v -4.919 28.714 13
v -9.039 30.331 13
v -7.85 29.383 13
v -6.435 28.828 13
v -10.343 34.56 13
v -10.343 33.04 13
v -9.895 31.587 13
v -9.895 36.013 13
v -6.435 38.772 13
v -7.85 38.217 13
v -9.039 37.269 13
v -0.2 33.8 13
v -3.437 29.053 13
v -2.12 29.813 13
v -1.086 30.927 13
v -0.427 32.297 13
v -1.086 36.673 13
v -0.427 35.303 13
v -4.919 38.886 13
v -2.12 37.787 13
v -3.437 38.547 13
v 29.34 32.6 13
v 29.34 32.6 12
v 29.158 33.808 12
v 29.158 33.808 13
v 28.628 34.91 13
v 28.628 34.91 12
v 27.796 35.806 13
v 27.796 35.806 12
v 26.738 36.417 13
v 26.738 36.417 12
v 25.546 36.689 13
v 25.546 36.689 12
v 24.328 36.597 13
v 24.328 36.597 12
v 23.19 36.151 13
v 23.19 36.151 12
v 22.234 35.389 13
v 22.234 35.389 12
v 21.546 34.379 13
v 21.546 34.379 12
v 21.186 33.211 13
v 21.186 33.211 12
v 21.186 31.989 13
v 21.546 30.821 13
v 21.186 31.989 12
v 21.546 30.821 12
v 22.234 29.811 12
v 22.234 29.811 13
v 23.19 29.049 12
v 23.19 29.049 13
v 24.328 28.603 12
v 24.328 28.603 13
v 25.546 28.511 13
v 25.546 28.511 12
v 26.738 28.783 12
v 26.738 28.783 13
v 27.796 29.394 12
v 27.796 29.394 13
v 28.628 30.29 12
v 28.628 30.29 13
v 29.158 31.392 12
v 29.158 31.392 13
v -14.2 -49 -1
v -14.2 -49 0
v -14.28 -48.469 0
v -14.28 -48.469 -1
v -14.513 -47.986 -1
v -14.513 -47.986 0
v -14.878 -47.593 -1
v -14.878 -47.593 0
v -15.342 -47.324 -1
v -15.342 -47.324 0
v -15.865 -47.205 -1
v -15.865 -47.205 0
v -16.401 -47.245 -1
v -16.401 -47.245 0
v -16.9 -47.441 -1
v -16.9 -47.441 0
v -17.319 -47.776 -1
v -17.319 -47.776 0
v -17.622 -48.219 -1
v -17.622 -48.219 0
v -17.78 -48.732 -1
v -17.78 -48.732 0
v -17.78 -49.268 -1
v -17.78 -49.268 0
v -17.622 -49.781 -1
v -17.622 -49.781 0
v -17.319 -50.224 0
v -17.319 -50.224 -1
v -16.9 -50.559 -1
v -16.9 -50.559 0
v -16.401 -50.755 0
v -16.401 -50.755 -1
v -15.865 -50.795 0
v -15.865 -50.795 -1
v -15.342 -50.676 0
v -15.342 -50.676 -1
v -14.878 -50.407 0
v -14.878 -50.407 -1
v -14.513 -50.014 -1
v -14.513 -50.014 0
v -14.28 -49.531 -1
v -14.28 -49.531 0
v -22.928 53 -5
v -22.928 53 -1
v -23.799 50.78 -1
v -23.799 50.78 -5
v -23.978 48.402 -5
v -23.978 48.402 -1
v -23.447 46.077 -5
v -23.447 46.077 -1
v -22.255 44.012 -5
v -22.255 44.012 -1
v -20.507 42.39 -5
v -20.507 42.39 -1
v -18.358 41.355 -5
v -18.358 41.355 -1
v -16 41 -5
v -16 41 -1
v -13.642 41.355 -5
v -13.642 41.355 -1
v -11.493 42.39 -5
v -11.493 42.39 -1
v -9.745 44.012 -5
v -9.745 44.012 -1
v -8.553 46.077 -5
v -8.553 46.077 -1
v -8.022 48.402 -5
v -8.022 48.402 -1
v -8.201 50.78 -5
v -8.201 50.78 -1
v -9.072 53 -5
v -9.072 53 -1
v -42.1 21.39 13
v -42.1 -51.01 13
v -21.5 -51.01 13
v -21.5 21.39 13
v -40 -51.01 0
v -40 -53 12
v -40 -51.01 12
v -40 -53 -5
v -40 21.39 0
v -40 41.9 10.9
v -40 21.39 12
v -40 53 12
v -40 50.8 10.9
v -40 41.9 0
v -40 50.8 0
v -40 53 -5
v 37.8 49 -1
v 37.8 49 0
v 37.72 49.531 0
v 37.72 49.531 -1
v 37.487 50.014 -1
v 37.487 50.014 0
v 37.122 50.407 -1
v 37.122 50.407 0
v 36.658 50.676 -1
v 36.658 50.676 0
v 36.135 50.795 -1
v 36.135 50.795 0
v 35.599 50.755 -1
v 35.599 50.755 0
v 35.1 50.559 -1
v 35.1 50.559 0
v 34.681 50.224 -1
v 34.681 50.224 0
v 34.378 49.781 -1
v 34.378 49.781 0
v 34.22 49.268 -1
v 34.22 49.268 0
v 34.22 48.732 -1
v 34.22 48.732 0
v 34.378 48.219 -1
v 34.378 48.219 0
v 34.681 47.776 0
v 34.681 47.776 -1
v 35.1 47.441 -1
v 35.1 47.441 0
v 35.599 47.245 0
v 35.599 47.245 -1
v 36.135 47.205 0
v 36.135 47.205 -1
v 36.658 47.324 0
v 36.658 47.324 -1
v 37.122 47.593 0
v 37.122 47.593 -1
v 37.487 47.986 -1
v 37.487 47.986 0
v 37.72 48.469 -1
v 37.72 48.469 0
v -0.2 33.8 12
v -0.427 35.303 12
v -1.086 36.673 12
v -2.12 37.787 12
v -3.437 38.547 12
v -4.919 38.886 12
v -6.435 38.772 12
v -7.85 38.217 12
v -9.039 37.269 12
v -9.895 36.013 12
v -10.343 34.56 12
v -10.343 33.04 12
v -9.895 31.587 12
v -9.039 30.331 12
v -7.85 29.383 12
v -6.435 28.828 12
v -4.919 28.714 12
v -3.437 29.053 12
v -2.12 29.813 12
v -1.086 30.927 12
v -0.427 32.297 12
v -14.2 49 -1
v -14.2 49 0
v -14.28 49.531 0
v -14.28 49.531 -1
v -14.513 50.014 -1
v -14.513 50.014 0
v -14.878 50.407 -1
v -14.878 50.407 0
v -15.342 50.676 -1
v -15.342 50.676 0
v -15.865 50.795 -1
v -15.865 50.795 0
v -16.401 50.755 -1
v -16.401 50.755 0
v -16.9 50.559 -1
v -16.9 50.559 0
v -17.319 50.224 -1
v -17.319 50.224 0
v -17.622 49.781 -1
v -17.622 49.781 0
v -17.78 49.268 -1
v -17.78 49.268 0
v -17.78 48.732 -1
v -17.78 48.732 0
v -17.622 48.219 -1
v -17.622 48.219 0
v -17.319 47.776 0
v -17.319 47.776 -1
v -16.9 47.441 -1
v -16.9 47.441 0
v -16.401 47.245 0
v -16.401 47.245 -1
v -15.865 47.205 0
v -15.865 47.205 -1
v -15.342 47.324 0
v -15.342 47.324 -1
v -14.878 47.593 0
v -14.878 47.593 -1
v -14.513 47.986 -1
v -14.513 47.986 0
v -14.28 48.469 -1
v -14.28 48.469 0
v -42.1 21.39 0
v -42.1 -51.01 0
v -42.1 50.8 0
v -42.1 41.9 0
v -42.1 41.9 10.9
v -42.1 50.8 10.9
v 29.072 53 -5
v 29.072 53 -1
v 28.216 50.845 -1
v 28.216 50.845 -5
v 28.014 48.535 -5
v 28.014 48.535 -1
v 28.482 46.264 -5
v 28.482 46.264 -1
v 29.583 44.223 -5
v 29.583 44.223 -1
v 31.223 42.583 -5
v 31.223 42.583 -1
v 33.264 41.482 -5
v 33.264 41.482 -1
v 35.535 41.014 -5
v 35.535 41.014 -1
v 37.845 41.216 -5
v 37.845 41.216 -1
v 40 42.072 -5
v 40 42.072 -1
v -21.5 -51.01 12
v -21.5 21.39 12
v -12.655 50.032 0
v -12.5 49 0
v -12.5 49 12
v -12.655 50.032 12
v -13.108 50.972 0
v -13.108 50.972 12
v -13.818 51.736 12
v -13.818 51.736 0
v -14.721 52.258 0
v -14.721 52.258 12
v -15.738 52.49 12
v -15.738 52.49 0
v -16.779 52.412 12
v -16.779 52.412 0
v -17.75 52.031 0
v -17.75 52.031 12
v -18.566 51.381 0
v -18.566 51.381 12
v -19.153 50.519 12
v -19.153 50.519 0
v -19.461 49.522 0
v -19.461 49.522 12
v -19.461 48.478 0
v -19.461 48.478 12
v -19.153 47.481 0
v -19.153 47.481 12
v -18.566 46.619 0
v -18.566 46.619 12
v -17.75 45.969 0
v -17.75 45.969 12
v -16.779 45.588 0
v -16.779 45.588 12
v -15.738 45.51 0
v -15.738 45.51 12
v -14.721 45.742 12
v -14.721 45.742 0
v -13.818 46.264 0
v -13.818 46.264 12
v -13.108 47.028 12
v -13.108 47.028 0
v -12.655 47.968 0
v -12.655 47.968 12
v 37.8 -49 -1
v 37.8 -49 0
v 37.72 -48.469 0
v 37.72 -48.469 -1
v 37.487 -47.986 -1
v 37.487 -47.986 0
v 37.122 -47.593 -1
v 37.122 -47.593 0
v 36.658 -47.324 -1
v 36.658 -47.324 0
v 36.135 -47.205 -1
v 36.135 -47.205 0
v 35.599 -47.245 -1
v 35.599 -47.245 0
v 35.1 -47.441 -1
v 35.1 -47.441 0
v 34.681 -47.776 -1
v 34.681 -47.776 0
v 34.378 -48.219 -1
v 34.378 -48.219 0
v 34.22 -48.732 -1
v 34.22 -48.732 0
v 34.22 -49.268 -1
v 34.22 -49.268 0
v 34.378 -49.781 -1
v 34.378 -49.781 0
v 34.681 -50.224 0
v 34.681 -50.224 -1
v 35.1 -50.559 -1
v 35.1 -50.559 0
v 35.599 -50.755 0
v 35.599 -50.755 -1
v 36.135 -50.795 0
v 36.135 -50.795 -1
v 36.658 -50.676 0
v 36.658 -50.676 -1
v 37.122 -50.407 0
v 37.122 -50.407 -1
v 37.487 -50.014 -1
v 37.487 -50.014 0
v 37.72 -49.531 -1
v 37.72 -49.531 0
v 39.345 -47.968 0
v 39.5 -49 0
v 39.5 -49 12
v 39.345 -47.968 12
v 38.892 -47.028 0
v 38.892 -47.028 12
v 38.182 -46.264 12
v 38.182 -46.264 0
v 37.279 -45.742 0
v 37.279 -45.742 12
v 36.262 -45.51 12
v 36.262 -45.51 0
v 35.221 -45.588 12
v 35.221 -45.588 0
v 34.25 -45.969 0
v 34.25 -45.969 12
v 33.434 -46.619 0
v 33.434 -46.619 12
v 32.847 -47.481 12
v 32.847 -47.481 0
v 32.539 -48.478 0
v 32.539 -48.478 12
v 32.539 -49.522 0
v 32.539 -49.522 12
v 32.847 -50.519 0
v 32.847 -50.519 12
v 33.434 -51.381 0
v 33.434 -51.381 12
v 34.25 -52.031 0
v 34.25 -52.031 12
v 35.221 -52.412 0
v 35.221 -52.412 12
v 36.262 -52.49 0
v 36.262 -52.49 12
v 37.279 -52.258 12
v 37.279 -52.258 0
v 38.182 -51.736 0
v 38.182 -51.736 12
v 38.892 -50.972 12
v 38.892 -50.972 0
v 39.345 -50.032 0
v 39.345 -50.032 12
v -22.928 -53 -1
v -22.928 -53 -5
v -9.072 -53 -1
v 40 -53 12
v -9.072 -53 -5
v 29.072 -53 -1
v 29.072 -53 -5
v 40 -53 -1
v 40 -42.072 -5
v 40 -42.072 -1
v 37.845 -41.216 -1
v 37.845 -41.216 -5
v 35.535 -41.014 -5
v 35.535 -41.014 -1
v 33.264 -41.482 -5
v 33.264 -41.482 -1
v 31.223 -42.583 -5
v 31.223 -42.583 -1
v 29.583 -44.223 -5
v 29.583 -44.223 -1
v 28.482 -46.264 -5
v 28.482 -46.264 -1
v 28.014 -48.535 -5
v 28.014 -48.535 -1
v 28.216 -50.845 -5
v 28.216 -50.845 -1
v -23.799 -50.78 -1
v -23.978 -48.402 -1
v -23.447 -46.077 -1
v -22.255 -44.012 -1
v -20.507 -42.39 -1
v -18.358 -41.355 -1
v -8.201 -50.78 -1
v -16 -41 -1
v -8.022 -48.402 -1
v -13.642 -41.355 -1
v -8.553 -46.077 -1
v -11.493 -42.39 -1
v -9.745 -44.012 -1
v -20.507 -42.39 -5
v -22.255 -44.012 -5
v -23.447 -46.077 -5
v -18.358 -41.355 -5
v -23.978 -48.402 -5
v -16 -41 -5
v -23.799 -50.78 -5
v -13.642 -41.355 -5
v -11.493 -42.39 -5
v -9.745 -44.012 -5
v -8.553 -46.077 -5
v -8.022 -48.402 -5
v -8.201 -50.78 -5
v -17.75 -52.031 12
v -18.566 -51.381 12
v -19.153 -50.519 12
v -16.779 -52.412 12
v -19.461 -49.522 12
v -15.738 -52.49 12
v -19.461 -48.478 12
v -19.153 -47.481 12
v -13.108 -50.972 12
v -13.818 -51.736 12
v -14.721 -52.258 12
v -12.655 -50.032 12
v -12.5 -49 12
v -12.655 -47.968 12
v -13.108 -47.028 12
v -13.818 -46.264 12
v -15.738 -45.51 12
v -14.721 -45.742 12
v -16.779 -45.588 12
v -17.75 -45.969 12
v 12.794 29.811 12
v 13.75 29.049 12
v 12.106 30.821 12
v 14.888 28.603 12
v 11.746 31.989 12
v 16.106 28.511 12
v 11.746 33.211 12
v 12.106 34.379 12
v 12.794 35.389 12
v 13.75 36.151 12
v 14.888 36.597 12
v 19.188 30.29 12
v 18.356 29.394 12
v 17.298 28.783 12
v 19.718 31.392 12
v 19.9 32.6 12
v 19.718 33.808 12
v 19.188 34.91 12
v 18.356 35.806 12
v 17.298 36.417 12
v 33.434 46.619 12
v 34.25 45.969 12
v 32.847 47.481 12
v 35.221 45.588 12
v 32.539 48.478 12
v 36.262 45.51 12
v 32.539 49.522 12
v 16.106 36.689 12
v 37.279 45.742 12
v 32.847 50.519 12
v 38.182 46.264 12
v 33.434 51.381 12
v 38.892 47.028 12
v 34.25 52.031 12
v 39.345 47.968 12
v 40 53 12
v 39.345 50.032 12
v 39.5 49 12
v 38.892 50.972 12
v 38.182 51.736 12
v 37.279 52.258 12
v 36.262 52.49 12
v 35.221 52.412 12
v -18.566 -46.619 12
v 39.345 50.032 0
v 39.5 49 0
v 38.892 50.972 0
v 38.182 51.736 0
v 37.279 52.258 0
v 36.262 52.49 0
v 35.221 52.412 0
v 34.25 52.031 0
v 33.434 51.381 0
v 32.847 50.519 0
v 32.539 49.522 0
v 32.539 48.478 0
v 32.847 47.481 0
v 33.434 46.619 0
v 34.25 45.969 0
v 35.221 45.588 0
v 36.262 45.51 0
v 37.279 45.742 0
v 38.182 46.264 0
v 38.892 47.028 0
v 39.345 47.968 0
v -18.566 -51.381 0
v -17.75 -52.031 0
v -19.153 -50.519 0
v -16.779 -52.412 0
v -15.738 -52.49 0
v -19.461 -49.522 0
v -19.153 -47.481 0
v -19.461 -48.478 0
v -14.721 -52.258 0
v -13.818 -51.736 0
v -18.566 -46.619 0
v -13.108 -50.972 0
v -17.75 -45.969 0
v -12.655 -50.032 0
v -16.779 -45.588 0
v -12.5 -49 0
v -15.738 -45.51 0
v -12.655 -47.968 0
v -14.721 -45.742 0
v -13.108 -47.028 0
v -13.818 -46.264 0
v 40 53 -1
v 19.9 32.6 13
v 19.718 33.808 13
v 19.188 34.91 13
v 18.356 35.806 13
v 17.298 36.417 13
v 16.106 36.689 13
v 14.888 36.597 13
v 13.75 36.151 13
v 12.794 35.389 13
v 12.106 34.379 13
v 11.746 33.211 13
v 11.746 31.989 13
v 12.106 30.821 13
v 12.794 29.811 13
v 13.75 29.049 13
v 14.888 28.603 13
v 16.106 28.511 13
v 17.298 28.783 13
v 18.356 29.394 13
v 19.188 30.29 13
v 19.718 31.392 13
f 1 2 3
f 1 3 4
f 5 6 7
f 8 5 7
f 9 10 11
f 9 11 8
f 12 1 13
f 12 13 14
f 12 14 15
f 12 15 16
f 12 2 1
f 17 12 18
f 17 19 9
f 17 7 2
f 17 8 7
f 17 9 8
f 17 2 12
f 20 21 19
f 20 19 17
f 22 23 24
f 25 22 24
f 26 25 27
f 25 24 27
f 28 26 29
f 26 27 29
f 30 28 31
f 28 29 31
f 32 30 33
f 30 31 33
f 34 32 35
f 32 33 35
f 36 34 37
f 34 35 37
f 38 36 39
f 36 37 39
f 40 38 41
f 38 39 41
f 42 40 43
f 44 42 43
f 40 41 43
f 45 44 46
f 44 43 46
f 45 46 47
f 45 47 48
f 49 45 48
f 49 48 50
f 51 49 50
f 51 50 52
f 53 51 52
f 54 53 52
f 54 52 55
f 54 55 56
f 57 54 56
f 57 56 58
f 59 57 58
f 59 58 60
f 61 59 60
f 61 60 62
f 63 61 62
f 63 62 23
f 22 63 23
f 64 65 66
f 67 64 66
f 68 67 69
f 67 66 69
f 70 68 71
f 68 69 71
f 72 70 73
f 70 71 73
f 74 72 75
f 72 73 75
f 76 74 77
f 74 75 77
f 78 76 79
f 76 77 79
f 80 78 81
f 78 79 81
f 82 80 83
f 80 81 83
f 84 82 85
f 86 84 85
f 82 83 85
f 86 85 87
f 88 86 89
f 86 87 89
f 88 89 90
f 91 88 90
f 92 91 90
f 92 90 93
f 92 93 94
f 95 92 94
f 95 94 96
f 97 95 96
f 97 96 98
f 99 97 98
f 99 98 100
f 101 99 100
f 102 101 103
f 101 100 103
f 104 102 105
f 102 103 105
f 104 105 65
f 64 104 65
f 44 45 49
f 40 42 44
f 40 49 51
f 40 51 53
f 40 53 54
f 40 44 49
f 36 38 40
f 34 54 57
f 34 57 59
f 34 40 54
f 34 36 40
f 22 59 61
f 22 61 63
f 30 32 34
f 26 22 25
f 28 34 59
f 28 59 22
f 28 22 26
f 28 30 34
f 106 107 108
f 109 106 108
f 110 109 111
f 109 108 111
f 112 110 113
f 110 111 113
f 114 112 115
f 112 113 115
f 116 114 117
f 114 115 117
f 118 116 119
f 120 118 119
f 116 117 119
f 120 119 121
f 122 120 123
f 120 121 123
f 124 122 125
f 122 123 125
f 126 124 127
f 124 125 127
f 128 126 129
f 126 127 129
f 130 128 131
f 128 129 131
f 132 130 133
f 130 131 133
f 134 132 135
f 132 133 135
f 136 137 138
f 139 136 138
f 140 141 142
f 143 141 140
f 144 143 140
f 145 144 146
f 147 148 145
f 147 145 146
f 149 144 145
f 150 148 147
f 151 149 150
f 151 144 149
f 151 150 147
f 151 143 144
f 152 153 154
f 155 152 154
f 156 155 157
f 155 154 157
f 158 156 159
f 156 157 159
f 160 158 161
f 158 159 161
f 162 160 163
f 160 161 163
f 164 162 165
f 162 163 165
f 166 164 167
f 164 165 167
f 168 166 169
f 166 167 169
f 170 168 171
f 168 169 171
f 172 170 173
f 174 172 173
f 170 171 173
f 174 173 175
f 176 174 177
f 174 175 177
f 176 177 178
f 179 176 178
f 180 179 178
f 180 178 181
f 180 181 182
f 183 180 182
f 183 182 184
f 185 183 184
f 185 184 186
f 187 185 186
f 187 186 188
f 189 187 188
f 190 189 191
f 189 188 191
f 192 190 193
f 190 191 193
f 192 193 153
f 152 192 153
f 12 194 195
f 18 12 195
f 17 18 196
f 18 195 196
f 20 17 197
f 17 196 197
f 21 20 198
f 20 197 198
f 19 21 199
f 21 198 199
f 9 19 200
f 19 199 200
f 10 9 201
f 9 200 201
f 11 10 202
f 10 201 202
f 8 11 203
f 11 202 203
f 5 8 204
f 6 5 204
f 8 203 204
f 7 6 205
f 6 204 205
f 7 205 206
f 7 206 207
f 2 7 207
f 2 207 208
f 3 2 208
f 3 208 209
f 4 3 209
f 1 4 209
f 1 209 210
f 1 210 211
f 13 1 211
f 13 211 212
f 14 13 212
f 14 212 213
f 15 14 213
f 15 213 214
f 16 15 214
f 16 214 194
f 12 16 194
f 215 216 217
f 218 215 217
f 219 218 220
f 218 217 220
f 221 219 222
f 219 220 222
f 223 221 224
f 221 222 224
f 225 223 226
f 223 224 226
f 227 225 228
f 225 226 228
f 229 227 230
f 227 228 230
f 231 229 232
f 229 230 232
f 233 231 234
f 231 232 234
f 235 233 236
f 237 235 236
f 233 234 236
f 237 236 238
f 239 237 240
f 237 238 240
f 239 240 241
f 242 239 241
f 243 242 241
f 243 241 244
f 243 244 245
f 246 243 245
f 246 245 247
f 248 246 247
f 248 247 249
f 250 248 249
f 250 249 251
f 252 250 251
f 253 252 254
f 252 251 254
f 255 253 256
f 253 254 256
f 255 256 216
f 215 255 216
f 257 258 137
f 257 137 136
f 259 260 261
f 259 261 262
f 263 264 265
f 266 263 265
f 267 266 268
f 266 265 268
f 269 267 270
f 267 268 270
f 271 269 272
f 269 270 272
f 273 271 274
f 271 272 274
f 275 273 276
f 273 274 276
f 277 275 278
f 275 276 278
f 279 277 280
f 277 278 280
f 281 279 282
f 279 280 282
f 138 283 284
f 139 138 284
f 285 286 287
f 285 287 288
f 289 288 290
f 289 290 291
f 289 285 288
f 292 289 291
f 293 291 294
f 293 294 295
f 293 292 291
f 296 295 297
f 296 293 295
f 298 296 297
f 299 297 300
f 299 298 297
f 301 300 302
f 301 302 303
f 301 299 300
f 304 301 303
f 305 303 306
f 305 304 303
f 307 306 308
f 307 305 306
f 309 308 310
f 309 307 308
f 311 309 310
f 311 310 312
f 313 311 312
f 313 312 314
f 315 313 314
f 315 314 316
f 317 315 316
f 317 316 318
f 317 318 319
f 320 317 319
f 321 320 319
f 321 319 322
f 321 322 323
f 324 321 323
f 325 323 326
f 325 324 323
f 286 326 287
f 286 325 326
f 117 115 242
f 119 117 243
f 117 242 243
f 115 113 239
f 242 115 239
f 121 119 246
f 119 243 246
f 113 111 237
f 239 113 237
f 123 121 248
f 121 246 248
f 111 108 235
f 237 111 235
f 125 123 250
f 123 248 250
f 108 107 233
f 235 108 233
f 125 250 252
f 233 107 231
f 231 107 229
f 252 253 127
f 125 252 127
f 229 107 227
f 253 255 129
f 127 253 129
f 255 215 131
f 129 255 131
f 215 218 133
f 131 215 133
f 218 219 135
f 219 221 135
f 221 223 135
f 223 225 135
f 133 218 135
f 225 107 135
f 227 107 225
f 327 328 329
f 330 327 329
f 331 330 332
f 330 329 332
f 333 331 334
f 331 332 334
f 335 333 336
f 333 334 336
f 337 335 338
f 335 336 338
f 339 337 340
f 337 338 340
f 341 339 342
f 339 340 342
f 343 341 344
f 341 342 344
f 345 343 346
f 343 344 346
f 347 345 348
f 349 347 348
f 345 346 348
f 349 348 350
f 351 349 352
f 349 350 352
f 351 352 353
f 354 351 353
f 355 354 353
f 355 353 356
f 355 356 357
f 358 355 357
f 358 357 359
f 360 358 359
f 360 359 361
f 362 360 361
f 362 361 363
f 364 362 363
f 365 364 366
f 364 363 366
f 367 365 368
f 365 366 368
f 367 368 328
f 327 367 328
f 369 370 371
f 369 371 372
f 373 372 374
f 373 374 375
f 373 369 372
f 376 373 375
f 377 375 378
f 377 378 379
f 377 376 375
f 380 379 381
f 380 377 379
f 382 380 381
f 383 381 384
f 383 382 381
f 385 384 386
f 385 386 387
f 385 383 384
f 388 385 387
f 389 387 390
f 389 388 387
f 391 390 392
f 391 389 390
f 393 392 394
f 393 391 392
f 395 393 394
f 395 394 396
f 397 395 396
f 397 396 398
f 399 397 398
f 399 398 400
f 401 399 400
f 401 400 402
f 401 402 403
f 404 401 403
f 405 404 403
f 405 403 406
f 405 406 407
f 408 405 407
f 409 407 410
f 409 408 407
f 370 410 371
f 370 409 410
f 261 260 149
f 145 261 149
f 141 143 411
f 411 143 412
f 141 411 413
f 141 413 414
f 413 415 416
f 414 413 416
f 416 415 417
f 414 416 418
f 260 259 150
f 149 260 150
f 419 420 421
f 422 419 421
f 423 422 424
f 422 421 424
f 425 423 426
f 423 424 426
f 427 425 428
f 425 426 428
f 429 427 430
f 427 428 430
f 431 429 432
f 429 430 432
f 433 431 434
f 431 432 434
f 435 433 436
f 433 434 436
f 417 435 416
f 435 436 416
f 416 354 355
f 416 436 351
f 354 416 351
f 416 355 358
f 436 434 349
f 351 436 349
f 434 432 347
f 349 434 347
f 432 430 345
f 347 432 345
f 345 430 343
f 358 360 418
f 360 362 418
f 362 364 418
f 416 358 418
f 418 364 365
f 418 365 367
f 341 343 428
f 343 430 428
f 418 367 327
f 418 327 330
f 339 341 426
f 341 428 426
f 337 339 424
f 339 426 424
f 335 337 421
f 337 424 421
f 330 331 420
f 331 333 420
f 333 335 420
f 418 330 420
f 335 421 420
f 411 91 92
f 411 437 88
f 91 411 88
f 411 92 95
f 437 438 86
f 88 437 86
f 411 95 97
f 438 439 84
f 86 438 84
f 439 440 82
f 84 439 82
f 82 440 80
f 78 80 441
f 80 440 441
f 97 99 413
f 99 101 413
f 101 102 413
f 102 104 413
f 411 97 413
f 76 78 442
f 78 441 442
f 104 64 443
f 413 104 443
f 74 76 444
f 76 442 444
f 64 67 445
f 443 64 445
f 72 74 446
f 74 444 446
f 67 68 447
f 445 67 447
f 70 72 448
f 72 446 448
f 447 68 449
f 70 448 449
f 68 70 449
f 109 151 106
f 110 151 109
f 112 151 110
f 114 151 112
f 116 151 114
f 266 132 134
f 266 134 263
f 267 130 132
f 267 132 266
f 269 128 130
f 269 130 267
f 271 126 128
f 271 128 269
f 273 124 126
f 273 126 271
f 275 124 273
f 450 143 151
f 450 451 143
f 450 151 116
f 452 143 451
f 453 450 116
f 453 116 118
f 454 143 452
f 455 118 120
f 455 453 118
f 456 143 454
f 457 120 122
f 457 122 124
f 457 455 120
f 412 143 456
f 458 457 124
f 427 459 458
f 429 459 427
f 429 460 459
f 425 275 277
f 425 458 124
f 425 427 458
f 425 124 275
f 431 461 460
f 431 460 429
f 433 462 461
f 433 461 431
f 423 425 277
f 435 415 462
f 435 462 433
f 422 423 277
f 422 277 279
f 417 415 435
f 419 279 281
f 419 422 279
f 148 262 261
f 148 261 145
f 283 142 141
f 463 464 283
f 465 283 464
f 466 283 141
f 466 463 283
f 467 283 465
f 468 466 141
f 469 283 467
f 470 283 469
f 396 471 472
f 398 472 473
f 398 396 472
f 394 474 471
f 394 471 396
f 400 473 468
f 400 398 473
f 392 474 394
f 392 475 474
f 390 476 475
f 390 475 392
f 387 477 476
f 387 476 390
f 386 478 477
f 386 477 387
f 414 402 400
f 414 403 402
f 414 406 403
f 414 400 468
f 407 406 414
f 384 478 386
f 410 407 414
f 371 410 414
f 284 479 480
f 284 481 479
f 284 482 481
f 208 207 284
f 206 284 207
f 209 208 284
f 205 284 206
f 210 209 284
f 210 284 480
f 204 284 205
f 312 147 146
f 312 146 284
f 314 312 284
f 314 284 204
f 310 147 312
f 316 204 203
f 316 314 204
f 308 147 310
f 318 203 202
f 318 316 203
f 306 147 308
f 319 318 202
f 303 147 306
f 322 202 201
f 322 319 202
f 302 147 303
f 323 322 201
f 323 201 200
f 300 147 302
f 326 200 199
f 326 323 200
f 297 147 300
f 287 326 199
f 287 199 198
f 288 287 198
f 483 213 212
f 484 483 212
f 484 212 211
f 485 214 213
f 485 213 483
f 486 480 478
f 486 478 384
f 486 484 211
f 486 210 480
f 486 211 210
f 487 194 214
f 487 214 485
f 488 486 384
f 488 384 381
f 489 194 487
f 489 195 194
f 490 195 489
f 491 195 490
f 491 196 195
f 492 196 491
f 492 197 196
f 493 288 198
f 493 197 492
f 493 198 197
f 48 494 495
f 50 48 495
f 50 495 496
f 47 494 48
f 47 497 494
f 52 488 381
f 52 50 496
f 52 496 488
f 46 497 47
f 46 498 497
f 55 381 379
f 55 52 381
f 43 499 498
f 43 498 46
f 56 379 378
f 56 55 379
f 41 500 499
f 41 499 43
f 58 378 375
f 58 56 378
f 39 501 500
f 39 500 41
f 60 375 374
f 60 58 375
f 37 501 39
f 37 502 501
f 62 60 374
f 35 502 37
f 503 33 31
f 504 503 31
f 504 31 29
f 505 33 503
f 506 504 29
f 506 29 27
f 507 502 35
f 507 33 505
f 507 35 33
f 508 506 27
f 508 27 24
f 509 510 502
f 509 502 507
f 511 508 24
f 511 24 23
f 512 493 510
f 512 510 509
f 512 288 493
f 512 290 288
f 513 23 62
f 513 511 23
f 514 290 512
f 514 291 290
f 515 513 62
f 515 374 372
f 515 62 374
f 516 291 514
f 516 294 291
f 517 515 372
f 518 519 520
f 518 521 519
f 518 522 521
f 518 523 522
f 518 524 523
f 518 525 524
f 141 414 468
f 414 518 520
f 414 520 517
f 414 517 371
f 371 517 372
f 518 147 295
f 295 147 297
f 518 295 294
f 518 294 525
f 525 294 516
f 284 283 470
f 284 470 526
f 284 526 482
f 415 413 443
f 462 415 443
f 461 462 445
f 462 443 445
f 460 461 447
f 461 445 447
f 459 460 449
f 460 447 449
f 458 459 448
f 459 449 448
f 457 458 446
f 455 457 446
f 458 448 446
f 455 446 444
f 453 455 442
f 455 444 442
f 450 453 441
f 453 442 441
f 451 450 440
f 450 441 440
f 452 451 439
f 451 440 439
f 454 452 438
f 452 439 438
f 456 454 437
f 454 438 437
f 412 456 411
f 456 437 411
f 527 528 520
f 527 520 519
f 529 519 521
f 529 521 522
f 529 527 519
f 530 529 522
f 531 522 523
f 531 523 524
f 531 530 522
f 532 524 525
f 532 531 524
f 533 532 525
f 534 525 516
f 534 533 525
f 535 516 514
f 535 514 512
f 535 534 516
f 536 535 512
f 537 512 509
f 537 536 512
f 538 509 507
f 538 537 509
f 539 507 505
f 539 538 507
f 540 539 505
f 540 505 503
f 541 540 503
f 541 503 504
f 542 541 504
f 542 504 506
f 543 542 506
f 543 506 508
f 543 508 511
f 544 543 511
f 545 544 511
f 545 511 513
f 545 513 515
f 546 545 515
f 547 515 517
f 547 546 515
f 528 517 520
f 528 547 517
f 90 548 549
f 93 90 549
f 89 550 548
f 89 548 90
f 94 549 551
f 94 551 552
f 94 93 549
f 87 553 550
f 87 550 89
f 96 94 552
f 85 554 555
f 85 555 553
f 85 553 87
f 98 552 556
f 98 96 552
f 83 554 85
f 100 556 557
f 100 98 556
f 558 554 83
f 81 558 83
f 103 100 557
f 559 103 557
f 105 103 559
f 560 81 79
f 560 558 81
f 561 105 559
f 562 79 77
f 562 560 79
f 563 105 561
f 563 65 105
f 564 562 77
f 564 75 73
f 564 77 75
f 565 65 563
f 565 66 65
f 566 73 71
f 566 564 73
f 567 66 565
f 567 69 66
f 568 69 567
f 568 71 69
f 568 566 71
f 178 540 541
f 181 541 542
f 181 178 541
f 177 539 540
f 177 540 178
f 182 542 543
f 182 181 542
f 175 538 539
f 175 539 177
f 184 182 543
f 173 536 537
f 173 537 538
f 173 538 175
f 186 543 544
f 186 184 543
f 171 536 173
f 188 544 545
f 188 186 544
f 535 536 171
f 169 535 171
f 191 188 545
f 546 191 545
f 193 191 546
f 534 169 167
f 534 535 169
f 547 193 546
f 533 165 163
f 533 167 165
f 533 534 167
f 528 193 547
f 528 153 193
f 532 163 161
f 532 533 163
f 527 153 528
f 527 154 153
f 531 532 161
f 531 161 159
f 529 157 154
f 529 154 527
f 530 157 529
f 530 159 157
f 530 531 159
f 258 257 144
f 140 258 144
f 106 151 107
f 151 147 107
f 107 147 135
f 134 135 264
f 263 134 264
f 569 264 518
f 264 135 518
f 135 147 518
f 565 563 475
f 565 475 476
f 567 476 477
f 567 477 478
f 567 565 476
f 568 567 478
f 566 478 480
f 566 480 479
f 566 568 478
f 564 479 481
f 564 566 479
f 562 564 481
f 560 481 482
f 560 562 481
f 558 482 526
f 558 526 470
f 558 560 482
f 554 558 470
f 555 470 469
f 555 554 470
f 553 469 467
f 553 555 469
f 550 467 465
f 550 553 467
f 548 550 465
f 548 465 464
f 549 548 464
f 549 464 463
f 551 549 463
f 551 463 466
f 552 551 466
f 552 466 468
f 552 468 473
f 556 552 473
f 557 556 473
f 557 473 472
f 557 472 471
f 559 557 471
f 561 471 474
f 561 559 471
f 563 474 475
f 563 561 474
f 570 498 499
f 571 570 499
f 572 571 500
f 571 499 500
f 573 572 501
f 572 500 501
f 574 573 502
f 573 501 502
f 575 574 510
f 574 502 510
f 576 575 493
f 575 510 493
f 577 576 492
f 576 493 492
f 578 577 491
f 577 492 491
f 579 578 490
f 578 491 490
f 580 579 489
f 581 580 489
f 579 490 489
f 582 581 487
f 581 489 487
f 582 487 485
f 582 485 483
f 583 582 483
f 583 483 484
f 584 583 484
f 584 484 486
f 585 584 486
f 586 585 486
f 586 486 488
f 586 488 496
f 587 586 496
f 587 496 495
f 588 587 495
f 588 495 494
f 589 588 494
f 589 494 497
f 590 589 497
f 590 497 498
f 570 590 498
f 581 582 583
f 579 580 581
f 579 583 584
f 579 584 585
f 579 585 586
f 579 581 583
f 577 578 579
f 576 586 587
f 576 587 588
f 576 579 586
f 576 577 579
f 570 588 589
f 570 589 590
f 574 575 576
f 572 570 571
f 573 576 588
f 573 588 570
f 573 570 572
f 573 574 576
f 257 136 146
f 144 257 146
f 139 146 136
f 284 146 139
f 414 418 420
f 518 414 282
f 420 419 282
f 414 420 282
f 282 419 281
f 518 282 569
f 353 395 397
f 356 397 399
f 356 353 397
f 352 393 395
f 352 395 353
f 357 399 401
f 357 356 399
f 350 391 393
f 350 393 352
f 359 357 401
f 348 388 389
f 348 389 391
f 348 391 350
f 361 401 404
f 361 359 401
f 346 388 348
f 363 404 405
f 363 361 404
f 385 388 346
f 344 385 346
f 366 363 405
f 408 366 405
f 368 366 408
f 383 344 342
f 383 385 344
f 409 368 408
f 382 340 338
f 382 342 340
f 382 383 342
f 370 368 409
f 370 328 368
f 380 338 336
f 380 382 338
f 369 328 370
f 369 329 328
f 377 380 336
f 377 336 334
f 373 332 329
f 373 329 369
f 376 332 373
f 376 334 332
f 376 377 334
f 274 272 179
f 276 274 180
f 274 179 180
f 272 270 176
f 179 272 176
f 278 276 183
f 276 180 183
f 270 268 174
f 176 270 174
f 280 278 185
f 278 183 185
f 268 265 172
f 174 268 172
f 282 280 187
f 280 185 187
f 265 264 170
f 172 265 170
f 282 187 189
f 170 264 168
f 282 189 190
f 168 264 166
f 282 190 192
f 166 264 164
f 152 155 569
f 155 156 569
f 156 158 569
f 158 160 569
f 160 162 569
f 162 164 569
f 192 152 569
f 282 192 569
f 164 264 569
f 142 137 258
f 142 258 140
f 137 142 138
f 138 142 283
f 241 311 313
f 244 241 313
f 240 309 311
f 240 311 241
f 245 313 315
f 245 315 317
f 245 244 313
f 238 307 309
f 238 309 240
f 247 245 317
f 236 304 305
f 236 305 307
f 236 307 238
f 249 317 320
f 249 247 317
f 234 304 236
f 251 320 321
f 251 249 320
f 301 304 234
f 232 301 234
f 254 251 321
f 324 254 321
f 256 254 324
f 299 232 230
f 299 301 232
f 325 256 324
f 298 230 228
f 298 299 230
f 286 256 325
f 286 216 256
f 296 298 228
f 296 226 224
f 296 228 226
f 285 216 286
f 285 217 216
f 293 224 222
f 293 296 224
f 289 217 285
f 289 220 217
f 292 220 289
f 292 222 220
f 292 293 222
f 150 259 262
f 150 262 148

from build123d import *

# Parameters (mm, degrees)
F0_W      = 80
F0_H      = 106
F0_R      = 1.8
F1_DEPTH  = 1
F2_W      = 20.6
F2_H      = 72.4
F3_DEPTH  = 13
F4_W      = 10
F4_H      = 8.9
F5_DEPTH  = 10.9
F6_R      = 5.1
F6_R_2    = 4.1
F7_DEPTH  = 13
F9_DEPTH  = 4
F10_W     = 80
F10_H     = 106
F10_R     = 3.5
F11_DEPTH = 12


with BuildPart() as f1:
    # F0 (on Top) → F1 (new body)
    with BuildSketch(Plane.XY):
        Rectangle(F0_W, F0_H)
        with Locations((-16, -49)):
            Circle(F0_R, mode=Mode.SUBTRACT)
        with Locations((36, -49)):
            Circle(F0_R, mode=Mode.SUBTRACT)
        with Locations((-16, 49)):
            Circle(F0_R, mode=Mode.SUBTRACT)
        with Locations((36, 49)):
            Circle(F0_R, mode=Mode.SUBTRACT)
    extrude(amount=-F1_DEPTH)

    # F2 (on face) → F3 (join)
    with BuildSketch(Plane.XY):
        with Locations((-31.8, -14.81)):
            Rectangle(F2_W, F2_H)
    extrude(amount=F3_DEPTH)

    # F4 (on face) → F5 (join)
    with BuildSketch(Plane.XY):
        with Locations((-37.1, 46.35)):
            Rectangle(F4_W, F4_H)
    extrude(amount=F5_DEPTH)

    # F6 (on face) → F7 (join)
    with BuildSketch(Plane.XY):
        with Locations((-5.3, 33.8)):
            Circle(F6_R)
        with Locations((15.8, 32.6)):
            Circle(F6_R_2)
        with Locations((25.24, 32.6)):
            Circle(F6_R_2)
    extrude(amount=F7_DEPTH)

    # F8 (on face) → F9 (join)
    with BuildSketch(Plane(origin=(0, 0, -1), x_dir=(1, 0, 0), z_dir=(0, 0, -1))):
        with BuildLine():
            Line((-22.928203, 53), (-40, 53))
            Line((-40, 53), (-40, -53))
            Line((-40, -53), (-22.928203, -53))
            ThreePointArc((-22.928203, -53), (-16, -41), (-9.071797, -53))
            Line((-9.071797, -53), (29.071797, -53))
            ThreePointArc((29.071797, -53), (30.343146, -43.343146), (40, -42.071797))
            Line((40, -42.071797), (40, 42.071797))
            ThreePointArc((40, 42.071797), (30.343146, 43.343146), (29.071797, 53))
            Line((29.071797, 53), (-9.071797, 53))
            ThreePointArc((-9.071797, 53), (-16, 41), (-22.928203, 53))
        make_face()
    extrude(amount=F9_DEPTH)

    # F10 (on face) → F11 (join)
    with BuildSketch(Plane.XY):
        Rectangle(F10_W, F10_H)
        with Locations((-16, -49)):
            Circle(F10_R, mode=Mode.SUBTRACT)
        with Locations((36, -49)):
            Circle(F10_R, mode=Mode.SUBTRACT)
        with Locations((-16, 49)):
            Circle(F10_R, mode=Mode.SUBTRACT)
        with Locations((36, 49)):
            Circle(F10_R, mode=Mode.SUBTRACT)
    extrude(amount=F11_DEPTH)


solid = f1.part
